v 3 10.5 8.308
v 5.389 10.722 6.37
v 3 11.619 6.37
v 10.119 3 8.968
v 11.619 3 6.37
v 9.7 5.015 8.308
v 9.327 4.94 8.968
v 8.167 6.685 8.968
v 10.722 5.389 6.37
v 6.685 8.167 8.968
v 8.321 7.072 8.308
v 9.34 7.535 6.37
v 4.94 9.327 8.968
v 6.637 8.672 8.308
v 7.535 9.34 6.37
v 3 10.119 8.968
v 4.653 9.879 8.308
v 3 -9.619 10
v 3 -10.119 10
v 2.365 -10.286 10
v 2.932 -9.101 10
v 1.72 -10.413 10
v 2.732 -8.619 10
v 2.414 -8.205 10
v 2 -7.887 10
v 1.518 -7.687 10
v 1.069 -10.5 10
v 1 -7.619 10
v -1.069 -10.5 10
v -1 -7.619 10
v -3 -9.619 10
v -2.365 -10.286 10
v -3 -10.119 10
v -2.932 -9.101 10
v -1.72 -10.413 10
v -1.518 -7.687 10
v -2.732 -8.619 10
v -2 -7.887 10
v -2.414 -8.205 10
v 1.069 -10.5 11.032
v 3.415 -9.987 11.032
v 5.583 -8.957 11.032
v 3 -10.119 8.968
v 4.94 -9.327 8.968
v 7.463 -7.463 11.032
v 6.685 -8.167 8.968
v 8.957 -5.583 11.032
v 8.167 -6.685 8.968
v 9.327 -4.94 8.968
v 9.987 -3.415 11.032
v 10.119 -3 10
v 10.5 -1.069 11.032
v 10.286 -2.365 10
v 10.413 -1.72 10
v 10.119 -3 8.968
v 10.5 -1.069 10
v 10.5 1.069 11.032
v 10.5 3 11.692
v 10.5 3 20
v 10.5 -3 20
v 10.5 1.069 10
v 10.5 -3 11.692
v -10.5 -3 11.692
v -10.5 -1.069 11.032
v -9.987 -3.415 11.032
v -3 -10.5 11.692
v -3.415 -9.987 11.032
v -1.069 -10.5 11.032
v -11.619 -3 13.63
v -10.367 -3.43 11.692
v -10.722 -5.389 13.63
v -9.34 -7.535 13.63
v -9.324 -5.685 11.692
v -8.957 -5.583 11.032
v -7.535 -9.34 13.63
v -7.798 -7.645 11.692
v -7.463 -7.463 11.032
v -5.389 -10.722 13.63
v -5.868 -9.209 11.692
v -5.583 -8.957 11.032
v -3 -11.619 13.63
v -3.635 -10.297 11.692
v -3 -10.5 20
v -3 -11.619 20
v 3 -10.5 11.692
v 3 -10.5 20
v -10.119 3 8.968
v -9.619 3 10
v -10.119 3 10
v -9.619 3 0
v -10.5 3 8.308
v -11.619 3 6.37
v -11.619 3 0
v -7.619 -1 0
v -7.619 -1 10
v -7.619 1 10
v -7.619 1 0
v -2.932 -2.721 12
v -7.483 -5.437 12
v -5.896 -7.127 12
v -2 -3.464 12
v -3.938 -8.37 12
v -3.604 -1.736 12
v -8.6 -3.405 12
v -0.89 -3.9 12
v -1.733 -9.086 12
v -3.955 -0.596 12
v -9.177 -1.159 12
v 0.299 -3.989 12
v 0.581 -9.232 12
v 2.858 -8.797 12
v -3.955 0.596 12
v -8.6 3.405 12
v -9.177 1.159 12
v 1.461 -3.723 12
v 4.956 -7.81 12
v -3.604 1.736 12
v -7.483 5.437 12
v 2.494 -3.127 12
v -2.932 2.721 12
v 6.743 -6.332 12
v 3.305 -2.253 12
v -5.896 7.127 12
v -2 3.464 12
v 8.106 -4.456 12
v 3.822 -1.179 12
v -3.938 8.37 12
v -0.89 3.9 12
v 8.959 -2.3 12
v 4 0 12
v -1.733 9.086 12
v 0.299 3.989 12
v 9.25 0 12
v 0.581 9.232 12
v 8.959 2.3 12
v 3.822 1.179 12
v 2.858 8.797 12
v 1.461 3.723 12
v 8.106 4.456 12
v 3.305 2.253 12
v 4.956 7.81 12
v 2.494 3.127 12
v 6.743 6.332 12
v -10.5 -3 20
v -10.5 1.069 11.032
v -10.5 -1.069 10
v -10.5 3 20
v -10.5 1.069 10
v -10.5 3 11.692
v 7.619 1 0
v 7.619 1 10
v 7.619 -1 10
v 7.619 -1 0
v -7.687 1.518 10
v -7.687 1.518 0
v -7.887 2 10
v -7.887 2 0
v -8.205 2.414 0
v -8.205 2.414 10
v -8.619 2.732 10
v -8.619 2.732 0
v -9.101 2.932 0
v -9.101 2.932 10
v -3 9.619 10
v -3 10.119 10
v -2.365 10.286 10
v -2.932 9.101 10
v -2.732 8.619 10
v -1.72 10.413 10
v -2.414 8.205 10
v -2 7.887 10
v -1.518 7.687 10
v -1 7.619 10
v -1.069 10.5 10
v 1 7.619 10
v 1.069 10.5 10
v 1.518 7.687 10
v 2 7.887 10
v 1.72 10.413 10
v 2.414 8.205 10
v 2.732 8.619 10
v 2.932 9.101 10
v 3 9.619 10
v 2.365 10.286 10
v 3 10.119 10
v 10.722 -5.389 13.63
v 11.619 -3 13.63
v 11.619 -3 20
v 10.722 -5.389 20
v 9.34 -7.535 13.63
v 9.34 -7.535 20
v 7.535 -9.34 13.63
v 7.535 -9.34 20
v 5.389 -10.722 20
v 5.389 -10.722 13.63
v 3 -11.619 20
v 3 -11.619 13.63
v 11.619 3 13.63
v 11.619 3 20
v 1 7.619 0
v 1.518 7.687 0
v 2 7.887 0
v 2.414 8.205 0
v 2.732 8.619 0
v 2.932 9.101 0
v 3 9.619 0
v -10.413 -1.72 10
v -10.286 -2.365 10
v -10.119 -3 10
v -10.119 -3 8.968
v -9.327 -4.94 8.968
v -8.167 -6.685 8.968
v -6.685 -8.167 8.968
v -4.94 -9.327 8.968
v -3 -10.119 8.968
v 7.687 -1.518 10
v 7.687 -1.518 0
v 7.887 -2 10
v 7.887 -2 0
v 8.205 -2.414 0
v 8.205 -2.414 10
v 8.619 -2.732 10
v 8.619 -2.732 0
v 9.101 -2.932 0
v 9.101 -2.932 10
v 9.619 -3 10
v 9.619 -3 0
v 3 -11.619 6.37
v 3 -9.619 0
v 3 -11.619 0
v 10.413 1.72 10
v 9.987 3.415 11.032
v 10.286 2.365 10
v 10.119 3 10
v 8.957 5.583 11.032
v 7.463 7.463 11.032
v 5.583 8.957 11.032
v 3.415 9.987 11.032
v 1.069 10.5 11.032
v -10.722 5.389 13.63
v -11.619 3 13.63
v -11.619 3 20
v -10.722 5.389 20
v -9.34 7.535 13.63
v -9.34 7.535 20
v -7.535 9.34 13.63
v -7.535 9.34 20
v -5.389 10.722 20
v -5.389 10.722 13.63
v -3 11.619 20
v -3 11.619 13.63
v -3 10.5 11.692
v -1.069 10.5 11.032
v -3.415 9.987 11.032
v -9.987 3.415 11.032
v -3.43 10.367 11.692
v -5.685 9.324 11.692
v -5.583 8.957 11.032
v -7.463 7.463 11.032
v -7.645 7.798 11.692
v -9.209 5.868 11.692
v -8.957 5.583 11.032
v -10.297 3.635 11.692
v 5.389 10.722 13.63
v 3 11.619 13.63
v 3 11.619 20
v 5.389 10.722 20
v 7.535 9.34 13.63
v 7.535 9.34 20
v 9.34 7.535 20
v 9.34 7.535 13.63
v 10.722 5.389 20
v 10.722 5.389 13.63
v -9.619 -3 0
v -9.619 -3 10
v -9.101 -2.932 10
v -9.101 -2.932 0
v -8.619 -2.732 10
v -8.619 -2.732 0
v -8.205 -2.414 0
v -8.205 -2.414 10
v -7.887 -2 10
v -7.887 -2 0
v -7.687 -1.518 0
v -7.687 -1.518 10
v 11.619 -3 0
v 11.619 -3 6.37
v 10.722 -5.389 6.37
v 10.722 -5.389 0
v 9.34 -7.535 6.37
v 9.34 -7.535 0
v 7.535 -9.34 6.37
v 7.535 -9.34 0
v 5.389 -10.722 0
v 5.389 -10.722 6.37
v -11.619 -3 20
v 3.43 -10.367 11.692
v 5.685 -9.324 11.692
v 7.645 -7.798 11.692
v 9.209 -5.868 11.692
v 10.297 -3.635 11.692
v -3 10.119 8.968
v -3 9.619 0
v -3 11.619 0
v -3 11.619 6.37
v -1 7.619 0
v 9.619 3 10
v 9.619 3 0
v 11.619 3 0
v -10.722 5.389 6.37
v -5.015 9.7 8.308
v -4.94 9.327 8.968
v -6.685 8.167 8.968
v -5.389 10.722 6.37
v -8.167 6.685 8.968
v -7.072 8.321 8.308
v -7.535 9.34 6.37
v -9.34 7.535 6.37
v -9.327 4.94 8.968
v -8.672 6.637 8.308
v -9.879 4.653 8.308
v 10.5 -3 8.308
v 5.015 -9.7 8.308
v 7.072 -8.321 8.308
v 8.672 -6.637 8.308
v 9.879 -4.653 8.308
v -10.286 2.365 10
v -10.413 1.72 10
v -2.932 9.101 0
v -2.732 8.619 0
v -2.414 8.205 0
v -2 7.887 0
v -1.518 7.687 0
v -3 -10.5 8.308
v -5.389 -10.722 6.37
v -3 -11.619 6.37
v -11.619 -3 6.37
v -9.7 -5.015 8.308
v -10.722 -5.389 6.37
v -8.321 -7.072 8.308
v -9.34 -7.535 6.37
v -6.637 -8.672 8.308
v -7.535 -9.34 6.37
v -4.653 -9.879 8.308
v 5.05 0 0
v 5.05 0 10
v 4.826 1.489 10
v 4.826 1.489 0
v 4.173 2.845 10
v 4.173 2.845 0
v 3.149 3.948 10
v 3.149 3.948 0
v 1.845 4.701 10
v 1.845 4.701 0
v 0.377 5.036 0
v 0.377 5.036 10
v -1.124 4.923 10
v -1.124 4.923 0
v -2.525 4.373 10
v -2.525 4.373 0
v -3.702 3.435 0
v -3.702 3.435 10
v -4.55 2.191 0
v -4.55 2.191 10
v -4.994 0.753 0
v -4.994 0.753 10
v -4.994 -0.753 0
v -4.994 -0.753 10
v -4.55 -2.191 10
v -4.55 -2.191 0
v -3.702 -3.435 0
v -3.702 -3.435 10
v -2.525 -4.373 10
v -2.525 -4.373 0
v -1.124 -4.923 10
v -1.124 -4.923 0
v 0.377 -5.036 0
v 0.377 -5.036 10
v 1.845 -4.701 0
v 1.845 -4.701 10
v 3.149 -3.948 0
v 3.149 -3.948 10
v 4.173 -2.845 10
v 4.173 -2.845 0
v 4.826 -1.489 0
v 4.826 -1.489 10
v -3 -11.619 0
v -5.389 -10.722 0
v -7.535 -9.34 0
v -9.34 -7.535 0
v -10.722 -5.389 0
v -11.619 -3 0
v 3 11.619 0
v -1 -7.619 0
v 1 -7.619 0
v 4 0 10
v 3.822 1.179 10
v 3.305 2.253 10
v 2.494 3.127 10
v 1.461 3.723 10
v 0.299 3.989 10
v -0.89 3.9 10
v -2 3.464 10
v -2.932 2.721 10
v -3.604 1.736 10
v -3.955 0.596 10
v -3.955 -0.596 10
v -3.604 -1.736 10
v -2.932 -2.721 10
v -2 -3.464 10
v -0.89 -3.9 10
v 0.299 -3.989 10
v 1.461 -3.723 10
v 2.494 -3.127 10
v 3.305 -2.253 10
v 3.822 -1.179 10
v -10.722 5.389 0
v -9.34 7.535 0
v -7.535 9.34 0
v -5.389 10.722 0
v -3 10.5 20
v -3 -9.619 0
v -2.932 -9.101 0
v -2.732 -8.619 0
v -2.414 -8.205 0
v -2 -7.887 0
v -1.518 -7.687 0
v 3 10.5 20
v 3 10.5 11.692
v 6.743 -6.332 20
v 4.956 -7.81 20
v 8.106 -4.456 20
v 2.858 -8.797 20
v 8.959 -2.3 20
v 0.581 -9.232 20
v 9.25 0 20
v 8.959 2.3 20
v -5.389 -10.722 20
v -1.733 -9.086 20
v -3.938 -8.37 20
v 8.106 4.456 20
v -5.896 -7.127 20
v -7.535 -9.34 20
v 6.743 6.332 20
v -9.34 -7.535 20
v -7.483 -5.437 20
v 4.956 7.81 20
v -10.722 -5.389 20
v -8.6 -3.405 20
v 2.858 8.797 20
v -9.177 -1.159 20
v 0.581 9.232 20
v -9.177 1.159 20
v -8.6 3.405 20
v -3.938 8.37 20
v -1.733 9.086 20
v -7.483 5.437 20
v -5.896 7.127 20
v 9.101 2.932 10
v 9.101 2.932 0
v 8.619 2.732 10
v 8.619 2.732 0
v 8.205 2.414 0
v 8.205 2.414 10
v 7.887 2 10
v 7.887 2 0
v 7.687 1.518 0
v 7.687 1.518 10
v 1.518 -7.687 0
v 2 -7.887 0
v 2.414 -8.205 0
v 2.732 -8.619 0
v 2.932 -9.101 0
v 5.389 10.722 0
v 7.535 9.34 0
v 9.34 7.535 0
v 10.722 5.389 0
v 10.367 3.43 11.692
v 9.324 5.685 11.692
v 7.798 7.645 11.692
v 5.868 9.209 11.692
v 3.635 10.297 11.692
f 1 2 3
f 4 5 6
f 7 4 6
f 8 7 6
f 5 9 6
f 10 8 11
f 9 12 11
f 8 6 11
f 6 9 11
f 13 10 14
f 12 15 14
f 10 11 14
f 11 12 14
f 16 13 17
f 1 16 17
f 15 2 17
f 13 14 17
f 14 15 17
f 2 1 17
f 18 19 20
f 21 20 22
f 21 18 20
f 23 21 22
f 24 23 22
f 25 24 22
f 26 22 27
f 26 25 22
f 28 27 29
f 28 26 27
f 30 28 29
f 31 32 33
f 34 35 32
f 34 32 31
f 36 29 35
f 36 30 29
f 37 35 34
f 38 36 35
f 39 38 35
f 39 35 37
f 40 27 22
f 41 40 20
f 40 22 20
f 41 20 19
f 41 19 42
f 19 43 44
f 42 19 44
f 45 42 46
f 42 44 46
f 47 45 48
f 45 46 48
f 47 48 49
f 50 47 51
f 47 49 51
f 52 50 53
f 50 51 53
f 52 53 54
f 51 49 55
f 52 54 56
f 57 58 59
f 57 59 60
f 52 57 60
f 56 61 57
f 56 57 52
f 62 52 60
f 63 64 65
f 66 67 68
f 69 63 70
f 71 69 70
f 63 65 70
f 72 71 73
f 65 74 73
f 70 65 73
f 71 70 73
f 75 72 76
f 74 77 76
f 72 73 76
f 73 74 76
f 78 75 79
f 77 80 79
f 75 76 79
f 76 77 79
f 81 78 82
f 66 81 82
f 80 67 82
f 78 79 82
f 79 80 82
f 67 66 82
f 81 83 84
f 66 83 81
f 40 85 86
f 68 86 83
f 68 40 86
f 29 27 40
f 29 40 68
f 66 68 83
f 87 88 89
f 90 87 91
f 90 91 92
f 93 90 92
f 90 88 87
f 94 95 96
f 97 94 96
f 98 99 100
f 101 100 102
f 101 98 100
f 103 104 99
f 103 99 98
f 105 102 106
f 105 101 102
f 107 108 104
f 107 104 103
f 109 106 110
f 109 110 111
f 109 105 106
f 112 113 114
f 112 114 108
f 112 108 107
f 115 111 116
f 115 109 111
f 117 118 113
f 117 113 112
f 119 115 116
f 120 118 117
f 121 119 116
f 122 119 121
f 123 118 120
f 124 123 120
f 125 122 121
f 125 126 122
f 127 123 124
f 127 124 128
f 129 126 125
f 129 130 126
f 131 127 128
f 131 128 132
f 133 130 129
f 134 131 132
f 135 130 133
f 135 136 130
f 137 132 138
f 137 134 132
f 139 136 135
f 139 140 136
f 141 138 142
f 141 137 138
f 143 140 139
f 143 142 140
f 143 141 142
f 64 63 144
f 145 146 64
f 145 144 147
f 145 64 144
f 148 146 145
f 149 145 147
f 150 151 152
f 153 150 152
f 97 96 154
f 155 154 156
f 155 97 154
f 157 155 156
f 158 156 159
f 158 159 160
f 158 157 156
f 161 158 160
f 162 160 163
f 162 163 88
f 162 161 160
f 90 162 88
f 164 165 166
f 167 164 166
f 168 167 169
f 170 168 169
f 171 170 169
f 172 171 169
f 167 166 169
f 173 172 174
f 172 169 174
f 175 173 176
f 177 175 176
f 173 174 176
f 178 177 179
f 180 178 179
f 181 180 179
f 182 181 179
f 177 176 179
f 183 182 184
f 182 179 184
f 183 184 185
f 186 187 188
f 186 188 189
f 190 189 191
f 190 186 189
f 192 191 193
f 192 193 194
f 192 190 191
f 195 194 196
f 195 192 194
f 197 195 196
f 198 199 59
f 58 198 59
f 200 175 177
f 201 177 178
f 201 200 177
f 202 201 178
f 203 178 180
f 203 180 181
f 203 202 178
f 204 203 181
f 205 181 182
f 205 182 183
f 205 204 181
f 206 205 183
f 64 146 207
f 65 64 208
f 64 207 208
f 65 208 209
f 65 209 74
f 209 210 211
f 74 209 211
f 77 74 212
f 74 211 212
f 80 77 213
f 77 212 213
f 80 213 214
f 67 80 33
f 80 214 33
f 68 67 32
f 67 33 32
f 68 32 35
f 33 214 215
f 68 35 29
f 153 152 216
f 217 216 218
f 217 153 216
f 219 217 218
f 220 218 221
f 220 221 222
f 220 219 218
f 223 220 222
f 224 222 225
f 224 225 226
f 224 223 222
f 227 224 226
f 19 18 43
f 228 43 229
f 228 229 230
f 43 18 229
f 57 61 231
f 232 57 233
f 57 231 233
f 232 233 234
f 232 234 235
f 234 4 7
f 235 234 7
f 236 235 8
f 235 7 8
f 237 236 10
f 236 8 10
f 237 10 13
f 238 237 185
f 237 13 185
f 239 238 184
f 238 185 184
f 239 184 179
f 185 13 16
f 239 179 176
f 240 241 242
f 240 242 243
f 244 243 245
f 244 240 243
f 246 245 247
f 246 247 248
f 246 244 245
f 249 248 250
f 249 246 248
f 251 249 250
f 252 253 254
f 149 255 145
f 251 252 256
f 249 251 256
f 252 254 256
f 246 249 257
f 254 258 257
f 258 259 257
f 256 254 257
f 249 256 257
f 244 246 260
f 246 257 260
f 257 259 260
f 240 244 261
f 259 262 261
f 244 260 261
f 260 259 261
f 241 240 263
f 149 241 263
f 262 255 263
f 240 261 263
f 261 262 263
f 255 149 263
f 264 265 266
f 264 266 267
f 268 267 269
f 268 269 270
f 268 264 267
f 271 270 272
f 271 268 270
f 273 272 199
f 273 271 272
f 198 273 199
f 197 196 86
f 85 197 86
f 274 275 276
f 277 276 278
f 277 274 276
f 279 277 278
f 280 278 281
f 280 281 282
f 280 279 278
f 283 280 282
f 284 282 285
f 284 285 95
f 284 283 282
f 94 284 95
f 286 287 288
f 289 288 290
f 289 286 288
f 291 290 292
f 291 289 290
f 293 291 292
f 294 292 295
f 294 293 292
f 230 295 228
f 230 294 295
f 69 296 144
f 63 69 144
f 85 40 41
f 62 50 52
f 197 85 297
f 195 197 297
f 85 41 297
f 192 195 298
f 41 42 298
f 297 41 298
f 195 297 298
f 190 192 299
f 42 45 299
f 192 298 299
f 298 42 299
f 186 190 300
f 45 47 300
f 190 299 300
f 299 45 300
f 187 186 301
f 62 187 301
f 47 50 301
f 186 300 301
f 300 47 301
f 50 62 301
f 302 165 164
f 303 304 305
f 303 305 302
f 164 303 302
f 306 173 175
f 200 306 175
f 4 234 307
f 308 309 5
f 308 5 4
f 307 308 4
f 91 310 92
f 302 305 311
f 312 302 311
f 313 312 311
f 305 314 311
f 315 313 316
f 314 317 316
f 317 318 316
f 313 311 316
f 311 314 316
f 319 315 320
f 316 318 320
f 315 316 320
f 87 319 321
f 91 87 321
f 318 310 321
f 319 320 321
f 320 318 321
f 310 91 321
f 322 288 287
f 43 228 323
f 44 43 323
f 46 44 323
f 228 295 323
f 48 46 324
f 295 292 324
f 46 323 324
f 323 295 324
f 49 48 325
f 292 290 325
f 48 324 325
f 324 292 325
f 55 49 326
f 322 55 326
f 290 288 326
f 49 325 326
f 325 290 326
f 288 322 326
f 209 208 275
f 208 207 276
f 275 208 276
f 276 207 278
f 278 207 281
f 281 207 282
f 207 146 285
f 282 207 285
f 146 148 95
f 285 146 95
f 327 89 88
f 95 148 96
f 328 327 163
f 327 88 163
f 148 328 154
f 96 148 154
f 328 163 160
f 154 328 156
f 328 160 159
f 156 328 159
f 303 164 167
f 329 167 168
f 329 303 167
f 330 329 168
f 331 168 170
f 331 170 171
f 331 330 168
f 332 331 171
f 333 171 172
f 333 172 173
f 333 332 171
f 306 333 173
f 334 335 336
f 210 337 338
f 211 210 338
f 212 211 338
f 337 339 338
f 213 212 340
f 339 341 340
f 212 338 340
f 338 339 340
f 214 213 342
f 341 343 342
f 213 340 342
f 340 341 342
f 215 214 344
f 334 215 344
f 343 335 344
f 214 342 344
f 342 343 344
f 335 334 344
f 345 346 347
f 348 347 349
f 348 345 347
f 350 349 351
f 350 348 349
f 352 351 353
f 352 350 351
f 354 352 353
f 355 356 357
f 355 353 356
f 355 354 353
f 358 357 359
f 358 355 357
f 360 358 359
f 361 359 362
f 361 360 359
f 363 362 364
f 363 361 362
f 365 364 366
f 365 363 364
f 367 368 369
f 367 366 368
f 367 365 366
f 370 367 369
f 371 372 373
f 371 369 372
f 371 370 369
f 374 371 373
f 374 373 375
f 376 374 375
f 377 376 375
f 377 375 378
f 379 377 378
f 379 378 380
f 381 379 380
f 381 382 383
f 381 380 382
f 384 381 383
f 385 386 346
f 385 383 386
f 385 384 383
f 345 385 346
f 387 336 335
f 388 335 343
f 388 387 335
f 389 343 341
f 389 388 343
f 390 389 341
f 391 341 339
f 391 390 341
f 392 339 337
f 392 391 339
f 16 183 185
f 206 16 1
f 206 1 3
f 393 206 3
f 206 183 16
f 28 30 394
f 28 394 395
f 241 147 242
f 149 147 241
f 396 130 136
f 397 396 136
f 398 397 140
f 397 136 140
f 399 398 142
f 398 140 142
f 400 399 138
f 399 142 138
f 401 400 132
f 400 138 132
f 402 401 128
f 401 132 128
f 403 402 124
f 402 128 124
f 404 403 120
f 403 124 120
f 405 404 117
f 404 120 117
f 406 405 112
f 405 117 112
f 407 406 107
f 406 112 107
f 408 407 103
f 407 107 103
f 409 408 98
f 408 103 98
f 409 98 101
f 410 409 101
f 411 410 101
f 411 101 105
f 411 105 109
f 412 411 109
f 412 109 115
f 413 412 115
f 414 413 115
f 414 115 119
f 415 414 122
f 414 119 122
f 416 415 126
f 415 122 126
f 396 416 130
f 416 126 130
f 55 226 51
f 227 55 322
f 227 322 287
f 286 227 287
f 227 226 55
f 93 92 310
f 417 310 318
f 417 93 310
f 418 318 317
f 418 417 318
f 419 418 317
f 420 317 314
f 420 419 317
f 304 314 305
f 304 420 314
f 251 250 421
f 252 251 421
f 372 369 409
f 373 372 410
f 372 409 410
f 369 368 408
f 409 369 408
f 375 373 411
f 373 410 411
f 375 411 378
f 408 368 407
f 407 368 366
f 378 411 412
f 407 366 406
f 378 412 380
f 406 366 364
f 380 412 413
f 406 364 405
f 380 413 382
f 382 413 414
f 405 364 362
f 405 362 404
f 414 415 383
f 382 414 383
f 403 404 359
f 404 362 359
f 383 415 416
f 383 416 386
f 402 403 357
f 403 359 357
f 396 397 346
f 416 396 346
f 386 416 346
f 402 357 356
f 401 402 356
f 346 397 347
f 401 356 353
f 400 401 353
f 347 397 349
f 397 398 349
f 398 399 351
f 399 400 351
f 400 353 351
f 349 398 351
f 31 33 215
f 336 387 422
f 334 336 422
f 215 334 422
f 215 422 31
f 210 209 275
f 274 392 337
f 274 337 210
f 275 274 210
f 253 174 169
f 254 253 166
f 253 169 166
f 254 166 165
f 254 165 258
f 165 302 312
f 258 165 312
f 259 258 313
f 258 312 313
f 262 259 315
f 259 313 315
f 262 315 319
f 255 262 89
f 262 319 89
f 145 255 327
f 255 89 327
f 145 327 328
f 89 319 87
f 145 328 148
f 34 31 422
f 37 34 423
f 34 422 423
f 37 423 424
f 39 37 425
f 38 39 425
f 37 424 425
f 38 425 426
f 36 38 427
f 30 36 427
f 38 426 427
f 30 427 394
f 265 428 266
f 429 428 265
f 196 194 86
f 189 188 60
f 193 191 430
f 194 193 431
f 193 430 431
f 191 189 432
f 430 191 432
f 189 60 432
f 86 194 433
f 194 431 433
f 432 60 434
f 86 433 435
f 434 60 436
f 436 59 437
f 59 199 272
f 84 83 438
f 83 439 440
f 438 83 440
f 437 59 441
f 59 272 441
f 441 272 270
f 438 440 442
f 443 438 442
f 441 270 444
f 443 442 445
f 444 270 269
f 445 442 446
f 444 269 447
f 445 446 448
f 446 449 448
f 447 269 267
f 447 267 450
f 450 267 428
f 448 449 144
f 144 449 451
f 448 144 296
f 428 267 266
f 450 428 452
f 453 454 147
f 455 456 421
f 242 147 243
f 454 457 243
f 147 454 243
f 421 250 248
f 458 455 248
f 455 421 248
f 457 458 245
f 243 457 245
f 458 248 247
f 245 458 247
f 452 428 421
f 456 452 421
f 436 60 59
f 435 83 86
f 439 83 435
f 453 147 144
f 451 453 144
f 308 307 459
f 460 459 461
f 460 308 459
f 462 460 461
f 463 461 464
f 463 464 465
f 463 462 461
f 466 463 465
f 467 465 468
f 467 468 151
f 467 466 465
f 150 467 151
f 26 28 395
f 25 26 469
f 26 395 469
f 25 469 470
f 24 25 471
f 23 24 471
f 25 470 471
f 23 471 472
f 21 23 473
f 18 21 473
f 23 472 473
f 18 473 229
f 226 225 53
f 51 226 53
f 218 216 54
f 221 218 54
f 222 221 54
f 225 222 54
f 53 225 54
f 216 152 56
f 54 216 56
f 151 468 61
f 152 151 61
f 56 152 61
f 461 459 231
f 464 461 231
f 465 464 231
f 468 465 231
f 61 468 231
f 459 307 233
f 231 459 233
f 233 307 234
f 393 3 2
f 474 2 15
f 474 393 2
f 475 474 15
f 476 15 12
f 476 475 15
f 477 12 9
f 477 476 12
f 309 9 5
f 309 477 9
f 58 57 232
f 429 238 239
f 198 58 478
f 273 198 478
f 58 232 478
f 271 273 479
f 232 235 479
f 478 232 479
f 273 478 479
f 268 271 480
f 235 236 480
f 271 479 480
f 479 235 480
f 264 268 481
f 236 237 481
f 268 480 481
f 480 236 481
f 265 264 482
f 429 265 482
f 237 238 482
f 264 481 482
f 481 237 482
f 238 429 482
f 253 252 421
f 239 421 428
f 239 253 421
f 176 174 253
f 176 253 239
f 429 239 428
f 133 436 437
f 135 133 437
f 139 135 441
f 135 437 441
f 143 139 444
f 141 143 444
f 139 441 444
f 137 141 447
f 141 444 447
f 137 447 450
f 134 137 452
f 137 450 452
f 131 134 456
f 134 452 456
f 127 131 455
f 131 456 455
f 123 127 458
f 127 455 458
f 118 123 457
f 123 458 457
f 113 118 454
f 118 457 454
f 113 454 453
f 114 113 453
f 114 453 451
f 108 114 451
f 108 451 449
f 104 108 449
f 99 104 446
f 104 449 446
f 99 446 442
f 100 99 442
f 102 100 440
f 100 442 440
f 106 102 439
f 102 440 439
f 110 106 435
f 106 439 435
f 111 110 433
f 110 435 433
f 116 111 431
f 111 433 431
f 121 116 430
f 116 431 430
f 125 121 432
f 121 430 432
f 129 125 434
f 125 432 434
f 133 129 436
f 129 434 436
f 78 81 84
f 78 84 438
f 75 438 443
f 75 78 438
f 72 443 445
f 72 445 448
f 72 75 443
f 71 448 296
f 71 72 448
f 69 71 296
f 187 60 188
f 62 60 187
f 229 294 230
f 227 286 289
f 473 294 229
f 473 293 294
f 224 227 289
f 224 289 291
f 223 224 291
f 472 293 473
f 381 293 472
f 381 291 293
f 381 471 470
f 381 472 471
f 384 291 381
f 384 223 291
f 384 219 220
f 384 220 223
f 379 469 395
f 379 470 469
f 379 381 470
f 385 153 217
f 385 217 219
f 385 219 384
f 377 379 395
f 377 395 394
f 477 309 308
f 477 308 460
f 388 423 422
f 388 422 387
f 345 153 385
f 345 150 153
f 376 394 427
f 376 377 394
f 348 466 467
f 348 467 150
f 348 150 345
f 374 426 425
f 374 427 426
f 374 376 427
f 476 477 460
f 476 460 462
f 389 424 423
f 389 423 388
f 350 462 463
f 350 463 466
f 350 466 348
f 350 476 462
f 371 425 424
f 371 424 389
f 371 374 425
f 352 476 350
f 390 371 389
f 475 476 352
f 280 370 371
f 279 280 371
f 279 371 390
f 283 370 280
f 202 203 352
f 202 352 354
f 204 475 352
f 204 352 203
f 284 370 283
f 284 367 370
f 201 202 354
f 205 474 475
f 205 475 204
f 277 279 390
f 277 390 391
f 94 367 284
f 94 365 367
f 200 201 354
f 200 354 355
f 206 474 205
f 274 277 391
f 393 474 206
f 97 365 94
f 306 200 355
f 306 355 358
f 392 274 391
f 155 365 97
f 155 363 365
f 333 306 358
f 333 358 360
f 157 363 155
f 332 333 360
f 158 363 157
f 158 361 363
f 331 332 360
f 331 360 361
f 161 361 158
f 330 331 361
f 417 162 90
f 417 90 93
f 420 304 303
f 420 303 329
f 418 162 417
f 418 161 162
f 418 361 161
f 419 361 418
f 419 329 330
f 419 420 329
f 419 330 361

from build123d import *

# Parameters (mm, degrees)
SKETCH1_R           = 5.05
BOSS_EXTRUDE1_DEPTH = 20
SKETCH2_R           = 9.25
CUT_EXTRUDE1_DEPTH  = 8
SKETCH4_R           = 7
SKETCH4_R_2         = 4
BOSS_EXTRUDE2_DEPTH = 2
CUT_EXTRUDE2_DEPTH  = 10


with BuildPart() as part:
    # Sketch1 → Boss-Extrude1 (new body)
    with BuildSketch(Plane.XY):
        with BuildLine():
            Line((-3, 10.5), (3, 10.5))
            Line((3, 10.5), (3, 11.618950039))
            ThreePointArc((3, 11.618950039), (8.485281374, 8.485281374), (11.618950039, 3))
            Line((11.618950039, 3), (10.5, 3))
            Line((10.5, 3), (10.5, -3))
            Line((10.5, -3), (11.618950039, -3))
            ThreePointArc((11.618950039, -3), (8.485281374, -8.485281374), (3, -11.618950039))
            Line((3, -11.618950039), (3, -10.5))
            Line((3, -10.5), (-3, -10.5))
            Line((-3, -10.5), (-3, -11.618950039))
            ThreePointArc((-3, -11.618950039), (-8.485281374, -8.485281374), (-11.618950039, -3))
            Line((-11.618950039, -3), (-10.5, -3))
            Line((-10.5, -3), (-10.5, 3))
            Line((-10.5, 3), (-11.618950039, 3))
            ThreePointArc((-11.618950039, 3), (-8.485281374, 8.485281374), (-3, 11.618950039))
            Line((-3, 11.618950039), (-3, 10.5))
        make_face()
        Circle(SKETCH1_R, mode=Mode.SUBTRACT)
    extrude(amount=BOSS_EXTRUDE1_DEPTH)

    # Sketch2 → Cut-Extrude1 (cut)
    with BuildSketch(Plane.XY.offset(20)):
        Circle(SKETCH2_R)
    extrude(amount=-CUT_EXTRUDE1_DEPTH, mode=Mode.SUBTRACT)

    # Cut-Sweep1: sweep along a curve in space
    with BuildLine() as cut_sweep1_path:
        ThreePointArc((9.25, 0, 20), (6.540737726, 6.540737726, 20), (0, 9.25, 20))
        ThreePointArc((0, 9.25, 20), (-6.540737726, 6.540737726, 20), (-9.25, 0, 20))
        ThreePointArc((-9.25, 0, 20), (-6.540737726, -6.540737726, 20), (0, -9.25, 20))
        ThreePointArc((0, -9.25, 20), (6.540737726, -6.540737726, 20), (9.25, 0, 20))
    # Sketch3 → Cut-Sweep1 (sweep, cut)
    with BuildSketch(Plane.XZ.offset(-3)):
        Polygon((10.118950039, 8.968340129), (10.118950039, 11.031659871), (11.618950039, 13.629736082), (11.618950039, 6.370263918), align=None)
    sweep(path=cut_sweep1_path.line, mode=Mode.SUBTRACT)

    # Sketch4 → Boss-Extrude2 (add)
    with BuildSketch(Plane.XY.offset(12)):
        Circle(SKETCH4_R)
        Circle(SKETCH4_R_2, mode=Mode.SUBTRACT)
    extrude(amount=-BOSS_EXTRUDE2_DEPTH)

    # Sketch5 → Cut-Extrude2 (cut)
    with BuildSketch(Plane(origin=(0, 0, 0), x_dir=(-1, 0, 0), z_dir=(0, 0, -1))):
        with BuildLine():
            Line((-11.618950039, 3), (-9.618950039, 3))
            ThreePointArc((-9.618950039, 3), (-8.204736476, 2.414213562), (-7.618950039, 1))
            Line((-7.618950039, 1), (-7.618950039, -1))
            ThreePointArc((-7.618950039, -1), (-8.204736476, -2.414213562), (-9.618950039, -3))
            Line((-9.618950039, -3), (-11.618950039, -3))
            Line((-11.618950039, -3), (-11.618950039, 3))
        make_face()
        with BuildLine():
            Line((-3, -11.618950039), (3, -11.618950039))
            Line((3, -11.618950039), (3, -9.618950039))
            ThreePointArc((3, -9.618950039), (2.414213562, -8.204736476), (1, -7.618950039))
            Line((1, -7.618950039), (-1, -7.618950039))
            ThreePointArc((-1, -7.618950039), (-2.414213562, -8.204736476), (-3, -9.618950039))
            Line((-3, -9.618950039), (-3, -11.618950039))
        make_face()
        with BuildLine():
            Line((3, 11.618950039), (3, 9.618950039))
            ThreePointArc((3, 9.618950039), (2.414213562, 8.204736476), (1, 7.618950039))
            Line((1, 7.618950039), (-1, 7.618950039))
            ThreePointArc((-1, 7.618950039), (-2.414213562, 8.204736476), (-3, 9.618950039))
            Line((-3, 9.618950039), (-3, 11.618950039))
            Line((-3, 11.618950039), (3, 11.618950039))
        make_face()
        with BuildLine():
            Line((11.618950039, -3), (9.618950039, -3))
            ThreePointArc((9.618950039, -3), (8.204736476, -2.414213562), (7.618950039, -1))
            Line((7.618950039, -1), (7.618950039, 1))
            ThreePointArc((7.618950039, 1), (8.204736476, 2.414213562), (9.618950039, 3))
            Line((9.618950039, 3), (11.618950039, 3))
            Line((11.618950039, 3), (11.618950039, -3))
        make_face()
    extrude(amount=-CUT_EXTRUDE2_DEPTH, mode=Mode.SUBTRACT)


solid = part.part
